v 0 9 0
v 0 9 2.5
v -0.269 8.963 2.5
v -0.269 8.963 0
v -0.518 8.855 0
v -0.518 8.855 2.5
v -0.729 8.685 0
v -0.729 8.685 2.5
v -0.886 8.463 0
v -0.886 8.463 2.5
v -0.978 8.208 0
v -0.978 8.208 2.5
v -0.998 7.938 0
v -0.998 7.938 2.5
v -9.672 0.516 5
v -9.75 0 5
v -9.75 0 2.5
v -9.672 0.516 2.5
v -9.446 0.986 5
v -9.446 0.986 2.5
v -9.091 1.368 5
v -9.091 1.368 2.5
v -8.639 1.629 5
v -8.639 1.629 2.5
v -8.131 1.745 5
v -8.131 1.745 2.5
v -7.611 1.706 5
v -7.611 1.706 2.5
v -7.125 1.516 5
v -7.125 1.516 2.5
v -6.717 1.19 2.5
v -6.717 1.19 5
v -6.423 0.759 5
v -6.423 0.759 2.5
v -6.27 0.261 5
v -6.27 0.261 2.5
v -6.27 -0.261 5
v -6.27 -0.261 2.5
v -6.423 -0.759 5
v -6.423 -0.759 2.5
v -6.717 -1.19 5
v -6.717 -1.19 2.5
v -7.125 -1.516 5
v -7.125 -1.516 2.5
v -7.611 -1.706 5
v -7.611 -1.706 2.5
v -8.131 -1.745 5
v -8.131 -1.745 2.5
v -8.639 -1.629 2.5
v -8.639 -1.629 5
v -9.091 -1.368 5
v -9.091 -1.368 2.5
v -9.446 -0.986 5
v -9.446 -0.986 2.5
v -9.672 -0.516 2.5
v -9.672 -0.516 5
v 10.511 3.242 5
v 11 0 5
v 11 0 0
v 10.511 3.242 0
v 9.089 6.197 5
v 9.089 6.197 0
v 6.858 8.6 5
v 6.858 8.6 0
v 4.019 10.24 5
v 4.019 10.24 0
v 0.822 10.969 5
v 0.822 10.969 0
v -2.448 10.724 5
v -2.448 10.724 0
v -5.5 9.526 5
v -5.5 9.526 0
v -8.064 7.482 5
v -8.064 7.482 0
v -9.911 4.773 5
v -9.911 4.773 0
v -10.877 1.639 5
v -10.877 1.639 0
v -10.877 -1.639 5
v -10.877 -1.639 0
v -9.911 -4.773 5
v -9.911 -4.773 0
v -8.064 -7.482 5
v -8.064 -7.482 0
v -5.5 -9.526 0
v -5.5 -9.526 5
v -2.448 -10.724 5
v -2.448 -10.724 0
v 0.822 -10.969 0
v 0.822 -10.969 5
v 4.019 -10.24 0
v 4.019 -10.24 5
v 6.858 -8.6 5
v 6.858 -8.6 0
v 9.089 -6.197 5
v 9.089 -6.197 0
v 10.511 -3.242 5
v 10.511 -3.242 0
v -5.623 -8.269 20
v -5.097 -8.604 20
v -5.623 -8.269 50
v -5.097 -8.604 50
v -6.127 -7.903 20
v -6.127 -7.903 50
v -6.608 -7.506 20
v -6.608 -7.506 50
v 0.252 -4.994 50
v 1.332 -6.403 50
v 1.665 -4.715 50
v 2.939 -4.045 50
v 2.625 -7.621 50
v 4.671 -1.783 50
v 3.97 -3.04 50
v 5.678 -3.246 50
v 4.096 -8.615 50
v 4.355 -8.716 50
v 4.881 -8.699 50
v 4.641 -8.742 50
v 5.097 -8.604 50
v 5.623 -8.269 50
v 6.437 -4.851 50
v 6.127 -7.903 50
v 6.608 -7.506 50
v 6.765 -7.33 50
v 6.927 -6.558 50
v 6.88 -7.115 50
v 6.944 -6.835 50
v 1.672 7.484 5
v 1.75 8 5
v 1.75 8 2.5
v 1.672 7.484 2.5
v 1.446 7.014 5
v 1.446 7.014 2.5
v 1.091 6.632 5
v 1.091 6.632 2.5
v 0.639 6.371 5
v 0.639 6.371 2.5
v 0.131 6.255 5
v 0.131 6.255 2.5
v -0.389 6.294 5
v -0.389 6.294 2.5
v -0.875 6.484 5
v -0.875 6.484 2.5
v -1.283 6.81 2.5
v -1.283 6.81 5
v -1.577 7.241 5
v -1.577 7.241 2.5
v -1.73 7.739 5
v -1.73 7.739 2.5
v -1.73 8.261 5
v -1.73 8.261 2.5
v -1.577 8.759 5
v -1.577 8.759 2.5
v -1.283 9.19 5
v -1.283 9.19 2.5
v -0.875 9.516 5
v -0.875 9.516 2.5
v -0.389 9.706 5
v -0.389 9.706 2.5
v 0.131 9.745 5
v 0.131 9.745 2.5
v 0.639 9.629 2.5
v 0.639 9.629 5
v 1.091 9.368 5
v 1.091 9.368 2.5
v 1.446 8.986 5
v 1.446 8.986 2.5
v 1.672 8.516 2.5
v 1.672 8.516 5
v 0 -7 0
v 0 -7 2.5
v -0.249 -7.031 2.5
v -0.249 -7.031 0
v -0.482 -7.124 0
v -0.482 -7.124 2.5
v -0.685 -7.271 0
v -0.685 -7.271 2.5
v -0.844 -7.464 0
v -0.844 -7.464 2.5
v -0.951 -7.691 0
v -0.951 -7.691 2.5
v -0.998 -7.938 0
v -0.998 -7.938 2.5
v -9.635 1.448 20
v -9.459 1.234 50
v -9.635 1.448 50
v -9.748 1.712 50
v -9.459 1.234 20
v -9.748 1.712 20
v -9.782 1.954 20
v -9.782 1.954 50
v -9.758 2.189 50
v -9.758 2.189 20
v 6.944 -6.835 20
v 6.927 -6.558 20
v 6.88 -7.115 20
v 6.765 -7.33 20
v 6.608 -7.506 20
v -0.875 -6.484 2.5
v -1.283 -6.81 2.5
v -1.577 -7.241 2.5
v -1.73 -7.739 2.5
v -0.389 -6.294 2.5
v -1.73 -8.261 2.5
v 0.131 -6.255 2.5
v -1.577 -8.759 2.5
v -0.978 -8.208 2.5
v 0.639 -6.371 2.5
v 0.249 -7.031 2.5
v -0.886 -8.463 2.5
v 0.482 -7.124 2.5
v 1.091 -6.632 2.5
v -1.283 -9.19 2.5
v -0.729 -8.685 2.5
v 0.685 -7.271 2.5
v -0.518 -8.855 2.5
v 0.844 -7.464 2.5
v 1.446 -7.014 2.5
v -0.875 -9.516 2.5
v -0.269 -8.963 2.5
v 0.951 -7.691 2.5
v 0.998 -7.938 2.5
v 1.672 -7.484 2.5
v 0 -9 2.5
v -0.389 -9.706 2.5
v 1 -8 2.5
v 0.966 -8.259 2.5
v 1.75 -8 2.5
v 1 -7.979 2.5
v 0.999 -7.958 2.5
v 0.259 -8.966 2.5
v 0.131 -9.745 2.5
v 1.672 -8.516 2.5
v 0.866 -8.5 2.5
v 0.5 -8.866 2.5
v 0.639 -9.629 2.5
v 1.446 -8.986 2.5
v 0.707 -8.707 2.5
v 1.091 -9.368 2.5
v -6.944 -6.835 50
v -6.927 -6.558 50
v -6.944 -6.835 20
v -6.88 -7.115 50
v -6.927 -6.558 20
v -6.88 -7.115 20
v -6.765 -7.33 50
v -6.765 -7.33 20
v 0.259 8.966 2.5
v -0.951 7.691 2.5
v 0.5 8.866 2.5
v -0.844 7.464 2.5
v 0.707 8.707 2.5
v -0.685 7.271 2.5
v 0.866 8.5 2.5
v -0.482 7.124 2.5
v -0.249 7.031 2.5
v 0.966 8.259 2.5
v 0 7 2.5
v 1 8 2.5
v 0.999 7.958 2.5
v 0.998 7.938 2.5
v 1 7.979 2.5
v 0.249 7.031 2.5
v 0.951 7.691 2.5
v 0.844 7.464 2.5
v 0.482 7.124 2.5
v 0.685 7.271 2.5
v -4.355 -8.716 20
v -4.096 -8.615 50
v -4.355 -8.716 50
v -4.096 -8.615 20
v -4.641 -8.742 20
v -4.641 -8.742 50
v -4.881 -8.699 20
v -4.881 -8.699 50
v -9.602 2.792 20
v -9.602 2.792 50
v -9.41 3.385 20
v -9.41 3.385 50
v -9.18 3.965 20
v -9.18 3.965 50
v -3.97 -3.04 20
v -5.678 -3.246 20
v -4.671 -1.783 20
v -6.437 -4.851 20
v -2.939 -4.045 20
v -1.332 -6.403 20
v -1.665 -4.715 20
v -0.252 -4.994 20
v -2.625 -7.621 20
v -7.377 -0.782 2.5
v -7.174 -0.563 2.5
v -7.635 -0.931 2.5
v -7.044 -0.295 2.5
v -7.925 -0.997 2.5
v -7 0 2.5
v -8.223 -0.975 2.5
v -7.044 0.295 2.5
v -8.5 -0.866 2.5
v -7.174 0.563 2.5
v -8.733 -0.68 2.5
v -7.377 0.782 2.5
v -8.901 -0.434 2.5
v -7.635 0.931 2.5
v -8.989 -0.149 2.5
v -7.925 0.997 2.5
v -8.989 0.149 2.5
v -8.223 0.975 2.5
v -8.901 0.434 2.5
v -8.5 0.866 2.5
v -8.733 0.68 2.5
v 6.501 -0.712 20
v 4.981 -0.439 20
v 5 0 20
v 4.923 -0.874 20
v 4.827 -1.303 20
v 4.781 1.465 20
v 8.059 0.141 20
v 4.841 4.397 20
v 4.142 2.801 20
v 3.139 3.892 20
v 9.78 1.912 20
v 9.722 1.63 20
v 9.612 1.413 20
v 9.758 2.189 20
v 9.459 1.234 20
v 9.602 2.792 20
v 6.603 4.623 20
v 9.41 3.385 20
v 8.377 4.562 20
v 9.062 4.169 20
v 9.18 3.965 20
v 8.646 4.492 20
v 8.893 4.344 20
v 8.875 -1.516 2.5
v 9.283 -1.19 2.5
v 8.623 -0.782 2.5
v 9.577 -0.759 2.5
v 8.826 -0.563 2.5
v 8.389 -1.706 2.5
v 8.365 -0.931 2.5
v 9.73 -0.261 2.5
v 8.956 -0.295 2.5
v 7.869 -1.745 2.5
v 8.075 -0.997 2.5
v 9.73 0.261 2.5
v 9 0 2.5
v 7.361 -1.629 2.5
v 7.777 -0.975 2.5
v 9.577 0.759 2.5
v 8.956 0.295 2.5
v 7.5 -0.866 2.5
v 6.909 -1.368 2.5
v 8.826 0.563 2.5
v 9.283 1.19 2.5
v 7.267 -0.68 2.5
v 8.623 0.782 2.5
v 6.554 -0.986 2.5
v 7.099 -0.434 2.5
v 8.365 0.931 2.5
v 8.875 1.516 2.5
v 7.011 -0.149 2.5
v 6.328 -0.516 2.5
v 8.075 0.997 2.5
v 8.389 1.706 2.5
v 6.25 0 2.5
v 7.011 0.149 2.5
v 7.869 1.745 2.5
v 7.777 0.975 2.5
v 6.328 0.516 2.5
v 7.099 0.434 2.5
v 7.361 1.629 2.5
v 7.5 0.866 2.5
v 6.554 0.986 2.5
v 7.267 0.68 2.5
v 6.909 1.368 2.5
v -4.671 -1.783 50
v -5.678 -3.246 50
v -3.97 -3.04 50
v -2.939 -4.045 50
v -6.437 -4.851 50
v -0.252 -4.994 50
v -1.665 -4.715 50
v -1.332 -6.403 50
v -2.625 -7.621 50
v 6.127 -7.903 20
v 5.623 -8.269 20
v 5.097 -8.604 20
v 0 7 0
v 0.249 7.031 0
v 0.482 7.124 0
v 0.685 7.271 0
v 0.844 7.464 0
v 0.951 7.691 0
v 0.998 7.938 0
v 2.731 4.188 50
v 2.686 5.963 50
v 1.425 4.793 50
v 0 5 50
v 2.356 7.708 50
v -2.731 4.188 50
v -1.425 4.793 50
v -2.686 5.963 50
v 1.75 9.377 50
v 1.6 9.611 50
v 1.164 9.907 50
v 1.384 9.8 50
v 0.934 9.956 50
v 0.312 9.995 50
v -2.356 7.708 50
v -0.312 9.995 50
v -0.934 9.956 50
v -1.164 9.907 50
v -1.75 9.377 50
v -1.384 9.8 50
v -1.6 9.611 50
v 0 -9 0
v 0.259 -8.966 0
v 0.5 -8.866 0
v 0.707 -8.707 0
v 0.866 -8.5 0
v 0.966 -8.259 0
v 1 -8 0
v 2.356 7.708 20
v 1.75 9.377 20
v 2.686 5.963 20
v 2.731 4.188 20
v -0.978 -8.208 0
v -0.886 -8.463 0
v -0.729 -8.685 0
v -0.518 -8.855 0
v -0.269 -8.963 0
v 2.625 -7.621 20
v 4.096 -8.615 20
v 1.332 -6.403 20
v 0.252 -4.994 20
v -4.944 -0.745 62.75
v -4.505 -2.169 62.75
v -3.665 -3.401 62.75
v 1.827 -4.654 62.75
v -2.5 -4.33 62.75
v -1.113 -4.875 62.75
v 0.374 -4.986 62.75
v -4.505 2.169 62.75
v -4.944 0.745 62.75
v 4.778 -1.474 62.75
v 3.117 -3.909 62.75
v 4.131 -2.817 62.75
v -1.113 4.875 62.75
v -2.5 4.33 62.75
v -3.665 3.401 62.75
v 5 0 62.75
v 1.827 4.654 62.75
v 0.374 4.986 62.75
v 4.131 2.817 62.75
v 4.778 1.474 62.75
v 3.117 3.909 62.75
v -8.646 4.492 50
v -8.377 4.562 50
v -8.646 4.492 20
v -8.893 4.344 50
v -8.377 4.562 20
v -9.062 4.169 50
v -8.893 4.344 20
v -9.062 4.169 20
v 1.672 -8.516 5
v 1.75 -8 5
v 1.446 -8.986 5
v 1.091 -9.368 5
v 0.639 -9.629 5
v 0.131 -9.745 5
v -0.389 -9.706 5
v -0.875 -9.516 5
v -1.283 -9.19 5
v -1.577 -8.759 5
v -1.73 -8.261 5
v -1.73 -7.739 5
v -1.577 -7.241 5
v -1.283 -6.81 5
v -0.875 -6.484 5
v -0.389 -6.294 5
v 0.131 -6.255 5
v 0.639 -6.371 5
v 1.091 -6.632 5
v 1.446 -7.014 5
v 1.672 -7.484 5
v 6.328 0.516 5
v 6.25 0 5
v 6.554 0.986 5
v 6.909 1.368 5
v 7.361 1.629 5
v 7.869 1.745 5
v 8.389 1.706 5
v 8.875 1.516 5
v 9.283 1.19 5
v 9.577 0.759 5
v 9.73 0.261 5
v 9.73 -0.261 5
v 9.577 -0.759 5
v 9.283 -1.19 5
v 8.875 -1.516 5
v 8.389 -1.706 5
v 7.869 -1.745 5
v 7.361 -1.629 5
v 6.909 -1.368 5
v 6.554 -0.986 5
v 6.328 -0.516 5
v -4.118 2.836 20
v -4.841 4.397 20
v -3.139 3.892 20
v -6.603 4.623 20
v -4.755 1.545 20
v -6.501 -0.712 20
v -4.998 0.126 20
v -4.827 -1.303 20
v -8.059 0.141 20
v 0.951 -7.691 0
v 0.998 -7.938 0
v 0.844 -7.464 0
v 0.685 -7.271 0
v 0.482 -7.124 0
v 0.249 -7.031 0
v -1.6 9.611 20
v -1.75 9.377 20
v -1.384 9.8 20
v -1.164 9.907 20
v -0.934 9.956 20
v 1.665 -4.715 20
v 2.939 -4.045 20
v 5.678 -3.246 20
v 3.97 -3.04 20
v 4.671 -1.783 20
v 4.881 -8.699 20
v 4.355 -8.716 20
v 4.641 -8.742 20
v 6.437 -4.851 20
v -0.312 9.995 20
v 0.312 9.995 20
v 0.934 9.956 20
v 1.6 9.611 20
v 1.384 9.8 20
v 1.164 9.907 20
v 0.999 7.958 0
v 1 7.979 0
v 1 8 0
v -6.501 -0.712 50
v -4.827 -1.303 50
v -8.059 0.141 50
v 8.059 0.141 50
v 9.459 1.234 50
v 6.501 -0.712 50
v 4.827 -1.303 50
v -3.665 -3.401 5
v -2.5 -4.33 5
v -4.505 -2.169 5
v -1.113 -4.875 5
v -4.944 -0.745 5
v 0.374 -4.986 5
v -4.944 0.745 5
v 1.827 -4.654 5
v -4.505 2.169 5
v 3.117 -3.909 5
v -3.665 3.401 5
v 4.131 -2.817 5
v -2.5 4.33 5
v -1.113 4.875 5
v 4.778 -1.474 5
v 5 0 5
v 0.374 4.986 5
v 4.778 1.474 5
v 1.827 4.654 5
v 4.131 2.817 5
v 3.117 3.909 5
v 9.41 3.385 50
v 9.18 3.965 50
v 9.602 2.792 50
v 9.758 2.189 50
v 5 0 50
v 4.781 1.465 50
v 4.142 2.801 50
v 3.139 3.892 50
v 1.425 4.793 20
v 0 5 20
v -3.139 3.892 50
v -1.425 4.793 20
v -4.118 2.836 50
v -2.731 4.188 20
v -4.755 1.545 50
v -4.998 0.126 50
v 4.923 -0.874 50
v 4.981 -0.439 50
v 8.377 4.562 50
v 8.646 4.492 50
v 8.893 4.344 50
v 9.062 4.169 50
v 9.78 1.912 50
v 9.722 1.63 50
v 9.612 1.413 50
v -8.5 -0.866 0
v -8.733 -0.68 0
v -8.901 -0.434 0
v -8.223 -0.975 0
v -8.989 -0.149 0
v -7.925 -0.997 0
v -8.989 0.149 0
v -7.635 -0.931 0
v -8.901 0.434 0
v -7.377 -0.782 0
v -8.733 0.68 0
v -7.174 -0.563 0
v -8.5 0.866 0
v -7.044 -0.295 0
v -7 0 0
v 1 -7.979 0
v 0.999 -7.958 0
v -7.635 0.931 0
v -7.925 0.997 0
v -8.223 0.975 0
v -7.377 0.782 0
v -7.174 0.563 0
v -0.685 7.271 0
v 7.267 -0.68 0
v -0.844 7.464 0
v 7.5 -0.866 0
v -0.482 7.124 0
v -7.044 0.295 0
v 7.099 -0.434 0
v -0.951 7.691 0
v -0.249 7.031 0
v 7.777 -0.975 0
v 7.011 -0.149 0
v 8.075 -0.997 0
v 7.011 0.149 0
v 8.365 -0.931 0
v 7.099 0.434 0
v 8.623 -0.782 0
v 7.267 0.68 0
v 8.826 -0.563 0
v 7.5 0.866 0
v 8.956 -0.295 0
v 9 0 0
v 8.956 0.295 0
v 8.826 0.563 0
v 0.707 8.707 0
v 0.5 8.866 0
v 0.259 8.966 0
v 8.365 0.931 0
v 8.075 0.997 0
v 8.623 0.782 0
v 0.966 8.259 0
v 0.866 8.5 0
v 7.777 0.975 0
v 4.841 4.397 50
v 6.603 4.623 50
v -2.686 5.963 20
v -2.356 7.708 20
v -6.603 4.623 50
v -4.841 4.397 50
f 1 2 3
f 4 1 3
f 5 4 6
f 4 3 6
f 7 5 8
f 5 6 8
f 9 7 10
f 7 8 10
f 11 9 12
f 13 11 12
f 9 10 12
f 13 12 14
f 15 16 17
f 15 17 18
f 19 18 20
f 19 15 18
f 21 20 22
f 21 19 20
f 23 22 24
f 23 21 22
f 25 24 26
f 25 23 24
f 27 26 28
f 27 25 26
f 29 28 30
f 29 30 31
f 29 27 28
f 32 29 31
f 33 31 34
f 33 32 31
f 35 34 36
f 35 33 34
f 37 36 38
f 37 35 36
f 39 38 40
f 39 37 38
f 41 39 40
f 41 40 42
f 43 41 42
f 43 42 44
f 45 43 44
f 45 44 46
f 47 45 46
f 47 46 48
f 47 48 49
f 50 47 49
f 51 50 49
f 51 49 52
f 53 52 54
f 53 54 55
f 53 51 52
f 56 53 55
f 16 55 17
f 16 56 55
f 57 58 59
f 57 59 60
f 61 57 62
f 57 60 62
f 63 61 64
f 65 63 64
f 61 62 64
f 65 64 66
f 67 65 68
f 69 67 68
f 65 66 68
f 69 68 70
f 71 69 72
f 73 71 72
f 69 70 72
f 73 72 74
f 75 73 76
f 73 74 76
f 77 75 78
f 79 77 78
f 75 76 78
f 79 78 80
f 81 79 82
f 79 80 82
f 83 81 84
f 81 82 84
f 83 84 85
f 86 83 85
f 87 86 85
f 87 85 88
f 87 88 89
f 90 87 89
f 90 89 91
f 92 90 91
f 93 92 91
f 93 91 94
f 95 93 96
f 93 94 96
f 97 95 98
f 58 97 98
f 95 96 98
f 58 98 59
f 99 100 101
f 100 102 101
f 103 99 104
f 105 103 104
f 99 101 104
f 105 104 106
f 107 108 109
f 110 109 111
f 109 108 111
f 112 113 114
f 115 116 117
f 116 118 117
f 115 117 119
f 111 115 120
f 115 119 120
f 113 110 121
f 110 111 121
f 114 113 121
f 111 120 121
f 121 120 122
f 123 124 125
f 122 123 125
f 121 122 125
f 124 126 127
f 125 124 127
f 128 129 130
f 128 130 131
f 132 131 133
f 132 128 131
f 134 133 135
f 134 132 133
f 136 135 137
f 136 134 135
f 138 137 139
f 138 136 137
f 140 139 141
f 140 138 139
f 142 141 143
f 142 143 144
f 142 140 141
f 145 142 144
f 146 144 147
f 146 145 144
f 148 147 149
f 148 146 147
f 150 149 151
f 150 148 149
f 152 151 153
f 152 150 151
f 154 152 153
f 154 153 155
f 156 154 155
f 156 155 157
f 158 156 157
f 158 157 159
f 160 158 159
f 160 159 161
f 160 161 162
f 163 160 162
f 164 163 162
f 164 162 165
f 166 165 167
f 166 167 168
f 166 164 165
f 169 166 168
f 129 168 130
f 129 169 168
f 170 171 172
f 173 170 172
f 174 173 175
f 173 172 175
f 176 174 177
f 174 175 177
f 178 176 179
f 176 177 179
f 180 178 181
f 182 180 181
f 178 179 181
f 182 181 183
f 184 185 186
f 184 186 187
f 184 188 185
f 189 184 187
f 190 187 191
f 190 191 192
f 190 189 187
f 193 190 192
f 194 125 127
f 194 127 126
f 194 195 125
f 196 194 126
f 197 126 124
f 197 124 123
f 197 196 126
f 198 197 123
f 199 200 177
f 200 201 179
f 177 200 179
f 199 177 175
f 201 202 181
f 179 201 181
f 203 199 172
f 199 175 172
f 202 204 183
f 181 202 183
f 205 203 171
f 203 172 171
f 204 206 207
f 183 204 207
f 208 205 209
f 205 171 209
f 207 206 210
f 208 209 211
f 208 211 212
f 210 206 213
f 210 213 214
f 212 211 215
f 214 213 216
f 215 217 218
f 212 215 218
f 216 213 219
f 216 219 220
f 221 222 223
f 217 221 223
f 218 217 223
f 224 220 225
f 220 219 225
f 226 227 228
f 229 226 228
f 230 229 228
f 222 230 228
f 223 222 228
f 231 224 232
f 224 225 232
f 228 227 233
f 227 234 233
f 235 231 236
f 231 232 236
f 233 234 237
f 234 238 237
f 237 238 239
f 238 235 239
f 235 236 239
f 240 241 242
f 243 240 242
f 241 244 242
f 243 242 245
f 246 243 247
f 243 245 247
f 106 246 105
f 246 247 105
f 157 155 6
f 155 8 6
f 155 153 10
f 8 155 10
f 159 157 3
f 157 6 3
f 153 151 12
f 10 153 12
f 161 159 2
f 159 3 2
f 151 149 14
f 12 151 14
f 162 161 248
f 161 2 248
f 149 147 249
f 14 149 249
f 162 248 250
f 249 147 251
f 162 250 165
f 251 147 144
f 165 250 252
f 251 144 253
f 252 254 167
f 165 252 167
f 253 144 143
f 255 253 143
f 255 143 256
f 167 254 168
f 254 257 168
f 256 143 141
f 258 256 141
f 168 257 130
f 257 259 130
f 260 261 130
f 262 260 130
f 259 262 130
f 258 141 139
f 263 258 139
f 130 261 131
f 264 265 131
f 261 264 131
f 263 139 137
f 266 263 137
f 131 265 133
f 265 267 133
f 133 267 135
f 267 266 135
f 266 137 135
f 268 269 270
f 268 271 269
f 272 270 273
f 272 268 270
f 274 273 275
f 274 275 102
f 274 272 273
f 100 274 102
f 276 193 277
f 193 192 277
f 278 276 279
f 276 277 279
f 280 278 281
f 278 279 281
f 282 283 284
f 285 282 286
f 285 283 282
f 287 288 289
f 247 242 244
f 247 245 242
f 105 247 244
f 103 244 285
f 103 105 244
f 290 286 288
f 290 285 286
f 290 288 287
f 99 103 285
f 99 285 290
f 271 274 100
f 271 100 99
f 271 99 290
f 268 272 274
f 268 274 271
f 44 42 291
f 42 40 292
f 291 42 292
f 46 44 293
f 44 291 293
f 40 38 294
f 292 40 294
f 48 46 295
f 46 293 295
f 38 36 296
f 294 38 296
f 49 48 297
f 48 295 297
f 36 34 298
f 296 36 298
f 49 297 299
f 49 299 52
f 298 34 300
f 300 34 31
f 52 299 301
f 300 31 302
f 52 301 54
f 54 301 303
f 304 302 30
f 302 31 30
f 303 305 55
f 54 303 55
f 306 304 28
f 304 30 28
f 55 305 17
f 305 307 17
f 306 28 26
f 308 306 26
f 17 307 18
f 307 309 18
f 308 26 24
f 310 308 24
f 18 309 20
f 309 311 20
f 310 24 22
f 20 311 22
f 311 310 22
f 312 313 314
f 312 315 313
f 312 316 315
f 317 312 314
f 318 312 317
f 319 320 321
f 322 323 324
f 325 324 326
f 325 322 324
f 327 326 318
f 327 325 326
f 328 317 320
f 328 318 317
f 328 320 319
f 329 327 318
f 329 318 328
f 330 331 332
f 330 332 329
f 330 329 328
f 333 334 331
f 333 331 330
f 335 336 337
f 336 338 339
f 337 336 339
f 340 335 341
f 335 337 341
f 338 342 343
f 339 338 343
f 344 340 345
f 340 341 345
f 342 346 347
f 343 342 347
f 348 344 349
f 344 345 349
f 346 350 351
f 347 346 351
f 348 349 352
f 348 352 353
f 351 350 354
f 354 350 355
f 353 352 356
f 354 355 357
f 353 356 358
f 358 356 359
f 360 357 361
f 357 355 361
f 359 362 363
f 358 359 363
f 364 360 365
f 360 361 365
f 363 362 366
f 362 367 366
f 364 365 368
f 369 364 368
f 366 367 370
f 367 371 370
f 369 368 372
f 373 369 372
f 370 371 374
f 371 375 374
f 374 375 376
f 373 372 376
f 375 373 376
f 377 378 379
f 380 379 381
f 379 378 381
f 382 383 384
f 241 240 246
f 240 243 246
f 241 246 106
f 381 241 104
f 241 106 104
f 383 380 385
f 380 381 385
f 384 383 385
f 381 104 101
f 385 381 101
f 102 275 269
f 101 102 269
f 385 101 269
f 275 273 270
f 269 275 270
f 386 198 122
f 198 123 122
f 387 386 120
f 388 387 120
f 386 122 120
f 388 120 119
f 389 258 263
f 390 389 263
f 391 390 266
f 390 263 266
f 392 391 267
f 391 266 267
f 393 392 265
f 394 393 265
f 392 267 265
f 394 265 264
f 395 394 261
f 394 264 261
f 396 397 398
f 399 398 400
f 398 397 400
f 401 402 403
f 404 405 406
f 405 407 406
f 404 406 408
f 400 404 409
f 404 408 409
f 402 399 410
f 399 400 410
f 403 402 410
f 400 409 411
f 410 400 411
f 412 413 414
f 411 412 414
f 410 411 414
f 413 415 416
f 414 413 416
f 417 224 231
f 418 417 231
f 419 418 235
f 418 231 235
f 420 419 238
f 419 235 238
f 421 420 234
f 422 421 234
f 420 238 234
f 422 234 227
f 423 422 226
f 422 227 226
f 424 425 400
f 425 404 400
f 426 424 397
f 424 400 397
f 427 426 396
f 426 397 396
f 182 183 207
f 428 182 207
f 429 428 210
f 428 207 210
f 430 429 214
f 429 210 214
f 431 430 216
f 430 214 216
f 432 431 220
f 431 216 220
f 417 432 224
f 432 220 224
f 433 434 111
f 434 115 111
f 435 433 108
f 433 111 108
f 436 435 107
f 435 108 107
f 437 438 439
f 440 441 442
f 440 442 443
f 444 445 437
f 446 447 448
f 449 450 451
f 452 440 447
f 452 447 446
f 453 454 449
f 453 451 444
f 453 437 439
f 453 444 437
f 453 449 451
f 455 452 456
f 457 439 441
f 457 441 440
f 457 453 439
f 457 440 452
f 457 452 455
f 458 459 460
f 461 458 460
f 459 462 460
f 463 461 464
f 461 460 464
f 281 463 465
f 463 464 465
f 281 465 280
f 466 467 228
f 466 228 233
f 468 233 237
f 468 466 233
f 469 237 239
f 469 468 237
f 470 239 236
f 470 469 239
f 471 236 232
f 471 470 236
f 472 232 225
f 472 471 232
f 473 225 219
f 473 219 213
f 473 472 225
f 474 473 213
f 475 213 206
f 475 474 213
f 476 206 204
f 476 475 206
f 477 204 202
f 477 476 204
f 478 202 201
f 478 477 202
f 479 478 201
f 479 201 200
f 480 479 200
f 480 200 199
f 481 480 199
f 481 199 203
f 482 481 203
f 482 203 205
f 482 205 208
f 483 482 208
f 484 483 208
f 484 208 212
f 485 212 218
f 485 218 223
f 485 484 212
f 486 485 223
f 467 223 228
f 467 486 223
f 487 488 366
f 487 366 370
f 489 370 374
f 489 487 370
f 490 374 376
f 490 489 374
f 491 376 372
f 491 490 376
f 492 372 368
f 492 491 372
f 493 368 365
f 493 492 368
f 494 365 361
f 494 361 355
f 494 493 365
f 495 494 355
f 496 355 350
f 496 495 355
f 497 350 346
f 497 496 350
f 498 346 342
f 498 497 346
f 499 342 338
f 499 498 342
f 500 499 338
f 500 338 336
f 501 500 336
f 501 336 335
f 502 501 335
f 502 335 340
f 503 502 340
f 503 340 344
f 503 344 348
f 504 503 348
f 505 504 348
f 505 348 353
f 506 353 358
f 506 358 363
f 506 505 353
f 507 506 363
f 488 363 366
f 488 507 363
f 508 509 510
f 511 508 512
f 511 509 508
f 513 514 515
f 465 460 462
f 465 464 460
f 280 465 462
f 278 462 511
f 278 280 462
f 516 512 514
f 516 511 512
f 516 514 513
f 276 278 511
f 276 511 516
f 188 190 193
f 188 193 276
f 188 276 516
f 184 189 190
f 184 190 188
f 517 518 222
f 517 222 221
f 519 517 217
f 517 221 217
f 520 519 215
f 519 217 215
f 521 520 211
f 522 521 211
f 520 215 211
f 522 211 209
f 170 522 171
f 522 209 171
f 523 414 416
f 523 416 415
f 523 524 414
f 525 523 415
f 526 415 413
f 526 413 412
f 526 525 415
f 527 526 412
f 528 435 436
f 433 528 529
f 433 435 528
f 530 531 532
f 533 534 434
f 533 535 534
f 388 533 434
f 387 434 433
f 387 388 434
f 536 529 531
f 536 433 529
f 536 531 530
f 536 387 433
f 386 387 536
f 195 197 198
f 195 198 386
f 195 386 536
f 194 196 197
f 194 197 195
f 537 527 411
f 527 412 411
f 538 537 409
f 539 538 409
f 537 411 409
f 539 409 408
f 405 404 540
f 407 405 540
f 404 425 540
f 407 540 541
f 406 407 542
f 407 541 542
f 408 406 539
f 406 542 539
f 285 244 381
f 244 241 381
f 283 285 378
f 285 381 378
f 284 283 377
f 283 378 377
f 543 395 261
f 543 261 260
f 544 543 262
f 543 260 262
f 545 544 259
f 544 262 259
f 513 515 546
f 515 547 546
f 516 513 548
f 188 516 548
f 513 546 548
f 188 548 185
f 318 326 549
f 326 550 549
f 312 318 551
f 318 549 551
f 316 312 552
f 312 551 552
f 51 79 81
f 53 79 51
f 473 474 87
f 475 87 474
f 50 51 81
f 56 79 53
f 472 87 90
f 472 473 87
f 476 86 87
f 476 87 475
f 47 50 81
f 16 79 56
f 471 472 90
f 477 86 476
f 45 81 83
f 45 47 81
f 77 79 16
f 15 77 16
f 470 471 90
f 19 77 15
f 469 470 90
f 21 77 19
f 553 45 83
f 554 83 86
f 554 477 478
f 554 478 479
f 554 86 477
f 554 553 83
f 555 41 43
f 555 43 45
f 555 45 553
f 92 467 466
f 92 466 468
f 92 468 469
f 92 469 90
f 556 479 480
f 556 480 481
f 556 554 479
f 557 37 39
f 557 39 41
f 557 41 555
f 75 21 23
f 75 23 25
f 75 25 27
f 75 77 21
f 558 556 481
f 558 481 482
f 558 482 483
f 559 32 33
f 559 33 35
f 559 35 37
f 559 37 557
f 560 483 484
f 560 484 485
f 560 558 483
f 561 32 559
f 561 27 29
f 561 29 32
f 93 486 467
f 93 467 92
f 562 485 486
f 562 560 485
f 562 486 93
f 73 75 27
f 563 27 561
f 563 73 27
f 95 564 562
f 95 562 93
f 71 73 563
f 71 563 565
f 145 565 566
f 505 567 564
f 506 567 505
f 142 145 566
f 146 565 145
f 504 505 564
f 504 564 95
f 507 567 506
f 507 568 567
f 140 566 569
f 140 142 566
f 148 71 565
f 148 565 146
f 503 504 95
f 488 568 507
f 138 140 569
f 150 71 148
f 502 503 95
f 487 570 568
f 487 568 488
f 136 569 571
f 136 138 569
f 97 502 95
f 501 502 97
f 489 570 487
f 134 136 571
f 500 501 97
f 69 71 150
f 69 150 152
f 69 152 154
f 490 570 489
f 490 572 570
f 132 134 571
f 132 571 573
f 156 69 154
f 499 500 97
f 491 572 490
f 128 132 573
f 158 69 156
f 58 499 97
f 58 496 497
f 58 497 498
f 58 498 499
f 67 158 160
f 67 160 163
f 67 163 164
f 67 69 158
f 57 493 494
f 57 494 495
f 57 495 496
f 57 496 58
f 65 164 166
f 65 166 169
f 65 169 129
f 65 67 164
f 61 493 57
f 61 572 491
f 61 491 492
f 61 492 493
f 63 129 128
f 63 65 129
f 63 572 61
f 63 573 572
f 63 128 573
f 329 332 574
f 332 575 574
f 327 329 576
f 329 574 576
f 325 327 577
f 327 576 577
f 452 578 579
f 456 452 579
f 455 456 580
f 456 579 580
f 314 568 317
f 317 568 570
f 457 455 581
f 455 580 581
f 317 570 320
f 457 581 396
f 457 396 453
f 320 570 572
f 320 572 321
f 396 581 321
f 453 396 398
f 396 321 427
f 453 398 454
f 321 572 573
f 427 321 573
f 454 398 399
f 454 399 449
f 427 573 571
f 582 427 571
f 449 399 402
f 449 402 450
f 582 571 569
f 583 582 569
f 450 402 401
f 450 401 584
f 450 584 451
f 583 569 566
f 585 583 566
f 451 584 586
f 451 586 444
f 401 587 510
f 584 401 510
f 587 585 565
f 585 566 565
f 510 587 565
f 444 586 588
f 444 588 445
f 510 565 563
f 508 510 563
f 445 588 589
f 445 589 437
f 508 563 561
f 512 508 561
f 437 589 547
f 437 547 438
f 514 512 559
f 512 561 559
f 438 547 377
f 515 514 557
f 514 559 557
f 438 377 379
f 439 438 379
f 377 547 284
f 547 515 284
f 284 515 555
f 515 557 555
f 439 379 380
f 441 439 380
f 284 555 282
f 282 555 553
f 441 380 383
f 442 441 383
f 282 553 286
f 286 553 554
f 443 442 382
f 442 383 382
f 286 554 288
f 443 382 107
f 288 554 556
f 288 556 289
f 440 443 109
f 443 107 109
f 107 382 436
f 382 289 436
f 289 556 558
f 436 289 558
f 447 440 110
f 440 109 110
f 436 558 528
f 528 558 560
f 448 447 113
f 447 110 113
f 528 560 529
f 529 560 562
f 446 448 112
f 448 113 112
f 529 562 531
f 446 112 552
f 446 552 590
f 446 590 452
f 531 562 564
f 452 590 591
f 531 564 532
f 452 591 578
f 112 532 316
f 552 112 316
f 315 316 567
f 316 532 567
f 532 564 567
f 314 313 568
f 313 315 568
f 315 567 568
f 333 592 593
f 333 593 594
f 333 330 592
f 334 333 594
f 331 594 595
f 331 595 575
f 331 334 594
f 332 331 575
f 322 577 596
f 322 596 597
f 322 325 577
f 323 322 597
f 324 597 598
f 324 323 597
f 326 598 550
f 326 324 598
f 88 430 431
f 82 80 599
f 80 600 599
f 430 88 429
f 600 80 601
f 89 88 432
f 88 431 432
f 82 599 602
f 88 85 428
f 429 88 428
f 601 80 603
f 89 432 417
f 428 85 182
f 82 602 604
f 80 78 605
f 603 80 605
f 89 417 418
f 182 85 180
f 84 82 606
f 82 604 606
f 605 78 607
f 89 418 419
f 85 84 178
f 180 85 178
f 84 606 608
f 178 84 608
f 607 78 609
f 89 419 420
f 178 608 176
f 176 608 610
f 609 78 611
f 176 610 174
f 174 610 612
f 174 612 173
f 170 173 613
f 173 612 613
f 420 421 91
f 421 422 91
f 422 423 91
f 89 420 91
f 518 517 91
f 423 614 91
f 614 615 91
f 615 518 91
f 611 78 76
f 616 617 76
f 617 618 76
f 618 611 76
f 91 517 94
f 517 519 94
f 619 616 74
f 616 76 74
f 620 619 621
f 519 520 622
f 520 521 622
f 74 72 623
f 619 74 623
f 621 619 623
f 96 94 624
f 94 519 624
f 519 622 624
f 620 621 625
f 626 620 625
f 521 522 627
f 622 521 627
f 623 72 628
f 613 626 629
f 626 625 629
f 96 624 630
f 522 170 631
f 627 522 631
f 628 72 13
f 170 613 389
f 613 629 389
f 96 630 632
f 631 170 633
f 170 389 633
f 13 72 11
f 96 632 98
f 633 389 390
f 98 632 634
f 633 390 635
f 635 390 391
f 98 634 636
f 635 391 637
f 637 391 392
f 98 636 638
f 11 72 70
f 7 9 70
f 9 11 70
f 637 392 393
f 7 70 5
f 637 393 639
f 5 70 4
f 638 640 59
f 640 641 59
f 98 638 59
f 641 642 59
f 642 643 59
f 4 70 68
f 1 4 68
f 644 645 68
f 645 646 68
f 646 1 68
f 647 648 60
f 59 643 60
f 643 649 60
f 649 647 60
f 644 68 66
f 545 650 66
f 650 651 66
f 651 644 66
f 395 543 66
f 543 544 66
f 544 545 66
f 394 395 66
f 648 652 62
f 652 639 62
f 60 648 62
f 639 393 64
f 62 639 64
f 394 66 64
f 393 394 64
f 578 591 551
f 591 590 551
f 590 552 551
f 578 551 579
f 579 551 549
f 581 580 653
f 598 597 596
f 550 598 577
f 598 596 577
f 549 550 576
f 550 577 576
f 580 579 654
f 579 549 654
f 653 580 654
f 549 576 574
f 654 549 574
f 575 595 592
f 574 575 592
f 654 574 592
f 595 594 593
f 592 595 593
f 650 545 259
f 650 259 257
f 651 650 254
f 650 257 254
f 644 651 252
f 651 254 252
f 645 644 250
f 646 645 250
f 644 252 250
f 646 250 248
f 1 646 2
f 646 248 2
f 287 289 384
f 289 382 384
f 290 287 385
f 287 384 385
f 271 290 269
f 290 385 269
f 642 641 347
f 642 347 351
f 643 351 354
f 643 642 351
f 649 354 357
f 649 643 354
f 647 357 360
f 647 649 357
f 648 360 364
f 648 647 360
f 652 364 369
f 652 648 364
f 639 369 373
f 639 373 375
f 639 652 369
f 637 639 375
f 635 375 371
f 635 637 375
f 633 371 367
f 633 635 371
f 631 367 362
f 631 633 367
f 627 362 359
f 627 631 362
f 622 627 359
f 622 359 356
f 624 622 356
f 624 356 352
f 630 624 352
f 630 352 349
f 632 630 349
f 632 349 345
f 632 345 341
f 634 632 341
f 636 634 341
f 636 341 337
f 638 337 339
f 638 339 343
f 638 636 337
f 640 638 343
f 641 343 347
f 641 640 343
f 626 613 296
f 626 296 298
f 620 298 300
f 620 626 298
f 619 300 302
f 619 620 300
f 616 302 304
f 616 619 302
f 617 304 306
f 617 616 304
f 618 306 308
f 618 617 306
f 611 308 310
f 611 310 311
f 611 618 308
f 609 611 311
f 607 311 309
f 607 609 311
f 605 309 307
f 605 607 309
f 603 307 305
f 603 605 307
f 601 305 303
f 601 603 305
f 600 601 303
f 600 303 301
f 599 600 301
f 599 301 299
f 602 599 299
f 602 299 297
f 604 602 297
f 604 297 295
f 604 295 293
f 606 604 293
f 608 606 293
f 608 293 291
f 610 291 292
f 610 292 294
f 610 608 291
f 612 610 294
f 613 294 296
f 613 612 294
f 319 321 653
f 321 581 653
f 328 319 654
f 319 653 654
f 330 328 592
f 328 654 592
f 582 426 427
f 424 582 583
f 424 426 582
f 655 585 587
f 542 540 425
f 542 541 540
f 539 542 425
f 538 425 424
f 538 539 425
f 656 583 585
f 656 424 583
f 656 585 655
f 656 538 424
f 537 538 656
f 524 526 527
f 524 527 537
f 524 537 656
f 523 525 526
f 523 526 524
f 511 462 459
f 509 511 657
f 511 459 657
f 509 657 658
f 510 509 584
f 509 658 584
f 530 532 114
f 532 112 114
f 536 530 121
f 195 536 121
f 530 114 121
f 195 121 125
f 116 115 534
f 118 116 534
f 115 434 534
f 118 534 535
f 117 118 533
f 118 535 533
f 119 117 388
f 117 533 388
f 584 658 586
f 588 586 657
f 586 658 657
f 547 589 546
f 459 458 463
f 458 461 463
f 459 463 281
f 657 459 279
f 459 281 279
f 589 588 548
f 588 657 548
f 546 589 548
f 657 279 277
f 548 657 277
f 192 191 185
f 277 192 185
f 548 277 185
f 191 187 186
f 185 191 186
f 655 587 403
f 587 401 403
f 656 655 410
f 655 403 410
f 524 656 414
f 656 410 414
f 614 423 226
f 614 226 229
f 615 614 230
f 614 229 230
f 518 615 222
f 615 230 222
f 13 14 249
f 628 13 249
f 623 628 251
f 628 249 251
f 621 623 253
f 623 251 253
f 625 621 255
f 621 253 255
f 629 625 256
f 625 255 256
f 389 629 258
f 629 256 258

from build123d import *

# Parameters (mm, degrees)
ESQUISSE1_R                        = 11
BOSS_EXTRU_1_DEPTH                 = 5
ENL_V_MAT_EXTRU_1_DEPTH            = 17.340134638
ESQUISSE3_R                        = 5
BOSS_EXTRU_2_DEPTH                 = 57.75
BOSS_EXTRU_3_DEPTH                 = 15
CONG_1_R                           = 1
R_P_TITION_CIRCULAIRE1_COUNT       = 5
CONG_1_OF_R_P_TITION_CIRCULAIRE1_R = 1
ESQUISSE3D1_R                      = 1.75
ENL_V_MAT_EXTRU_2_DEPTH            = 2.5
ENL_V_MAT_EXTRU_3_OUTLINE_R        = 1
ENL_V_MAT_EXTRU_3_DEPTH            = 2.5


# Read off the part's stored shape, not the designer's step: Enlèv. mat.-Extru.3
with BuildPart() as part:
    # Esquisse1 → Boss.-Extru.1 (new body)
    with BuildSketch(Plane.XY):
        Circle(ESQUISSE1_R)
    extrude(amount=BOSS_EXTRU_1_DEPTH)

    # Esquisse2 → Enlèv. mat.-Extru.1 (cut, through all)
    with BuildSketch(Plane.XY.offset(5)):
        with BuildLine():
            ThreePointArc((1, 8), (0.707106781, 8.707106781), (0, 9))
            Line((0, 9), (0, 8))
            ThreePointArc((0, 8), (0.5, 7.984359711), (0.998044964, 7.9375))
            ThreePointArc((0.998044964, 7.9375), (0.999511121, 7.968734715), (1, 8))
        make_face()
        with BuildLine():
            Line((0, 8), (0, 9))
            ThreePointArc((0, 9), (-0.728868987, 8.684653197), (-0.998044964, 7.9375))
            ThreePointArc((-0.998044964, 7.9375), (-0.5, 7.984359711), (0, 8))
        make_face()
        with BuildLine():
            ThreePointArc((0.998044964, 7.9375), (0.5, 7.984359711), (0, 8))
            Line((0, 8), (0, 7))
            ThreePointArc((0, 7), (0.684653197, 7.271131013), (0.998044964, 7.9375))
        make_face()
        with BuildLine():
            Line((0, 7), (0, 8))
            ThreePointArc((0, 8), (-0.5, 7.984359711), (-0.998044964, 7.9375))
            ThreePointArc((-0.998044964, 7.9375), (-0.684653197, 7.271131013), (0, 7))
        make_face()
        with BuildLine():
            ThreePointArc((0, -7), (-0.684653197, -7.271131013), (-0.998044964, -7.9375))
            ThreePointArc((-0.998044964, -7.9375), (-0.5, -7.984359711), (0, -8))
            Line((0, -8), (0, -7))
        make_face()
        with BuildLine():
            ThreePointArc((0, -8), (-0.5, -7.984359711), (-0.998044964, -7.9375))
            ThreePointArc((-0.998044964, -7.9375), (-0.728868987, -8.684653197), (0, -9))
            Line((0, -9), (0, -8))
        make_face()
        with BuildLine():
            ThreePointArc((0.998044964, -7.9375), (0.684653197, -7.271131013), (0, -7))
            Line((0, -7), (0, -8))
            ThreePointArc((0, -8), (0.5, -7.984359711), (0.998044964, -7.9375))
        make_face()
        with BuildLine():
            ThreePointArc((0.998044964, -7.9375), (0.5, -7.984359711), (0, -8))
            Line((0, -8), (0, -9))
            ThreePointArc((0, -9), (0.707106781, -8.707106781), (1, -8))
            ThreePointArc((1, -8), (0.999511121, -7.968734715), (0.998044964, -7.9375))
        make_face()
    extrude(amount=-ENL_V_MAT_EXTRU_1_DEPTH, mode=Mode.SUBTRACT)

    # Esquisse3 → Boss.-Extru.2 (add)
    with BuildSketch(Plane.XY.offset(5)):
        Circle(ESQUISSE3_R)
    extrude(amount=BOSS_EXTRU_2_DEPTH)

    # Esquisse4 → Boss.-Extru.3 (add, symmetric)
    with BuildSketch(Plane.XY.offset(35)):
        with BuildLine():
            ThreePointArc((-2.731158071, 4.188170912), (-2.5, 7.120566641), (-1.5, 9.886859967))
            ThreePointArc((-1.5, 9.886859967), (0, 10), (1.5, 9.886859967))
            ThreePointArc((1.5, 9.886859967), (2.5, 7.120566641), (2.731158071, 4.188170912))
            ThreePointArc((2.731158071, 4.188170912), (0, -5), (-2.731158071, 4.188170912))
        make_face()
    boss_extru_3 = extrude(amount=BOSS_EXTRU_3_DEPTH, both=True)

    # Congé1
    cong_1_edges = [part.edges().sort_by_distance(p)[0] for p in [
        (1.5, 9.886859967, 35),
        (-1.5, 9.886859967, 35),
    ]]
    fillet(cong_1_edges, radius=CONG_1_R)

    # Répétition circulaire1: Boss.-Extru.3 ×5 about axis
    r_p_tition_circulaire1_axis = Axis((0, 0, 0), (0, 0, 1))
    for i in range(1, R_P_TITION_CIRCULAIRE1_COUNT):
        add(boss_extru_3.rotate(r_p_tition_circulaire1_axis, i * 360 / R_P_TITION_CIRCULAIRE1_COUNT))

    # Congé1 of Répétition circulaire1
    cong_1_of_r_p_tition_circulaire1_edges = [part.edges().sort_by_distance(p)[0] for p in [
        (-8.939437105, 4.481792525, 35),
        (-9.866488089, 1.628622976, 35),
        (-7.024875971, -7.116959856, 35),
        (-4.597824988, -8.880315612, 35),
        (4.597824988, -8.880315612, 35),
        (7.024875971, -7.116959856, 35),
        (9.866488089, 1.628622976, 35),
        (8.939437105, 4.481792525, 35),
    ]]
    fillet(cong_1_of_r_p_tition_circulaire1_edges, radius=CONG_1_OF_R_P_TITION_CIRCULAIRE1_R)

    # Esquisse3D1 → Enlèv. mat.-Extru.2 (cut)
    with BuildSketch(Plane(origin=(0, -8, 5), x_dir=(0, 1, 0), z_dir=(-7.673874556635152e-12, 0, -1.0))):
        with Locations(Location((0, 0, 0), (0, 0, 90))):
            Circle(ESQUISSE3D1_R)
        with Locations(Location((8, 8, 0), (0, 0, 270))):
            Circle(ESQUISSE3D1_R)
        with Locations(Location((8, -8, 0), (0, 0, 270))):
            Circle(ESQUISSE3D1_R)
        with Locations(Location((16, 0, 0), (0, 0, 90))):
            Circle(ESQUISSE3D1_R)
    extrude(amount=ENL_V_MAT_EXTRU_2_DEPTH, mode=Mode.SUBTRACT)

    # Enlèv. mat.-Extru.3 outline → Enlèv. mat.-Extru.3 (cut)
    with BuildSketch(Plane.XY):
        with Locations((8, 0)):
            Circle(ENL_V_MAT_EXTRU_3_OUTLINE_R)
        with Locations((-8, 0)):
            Circle(ENL_V_MAT_EXTRU_3_OUTLINE_R)
    extrude(amount=ENL_V_MAT_EXTRU_3_DEPTH, mode=Mode.SUBTRACT)


solid = part.part
